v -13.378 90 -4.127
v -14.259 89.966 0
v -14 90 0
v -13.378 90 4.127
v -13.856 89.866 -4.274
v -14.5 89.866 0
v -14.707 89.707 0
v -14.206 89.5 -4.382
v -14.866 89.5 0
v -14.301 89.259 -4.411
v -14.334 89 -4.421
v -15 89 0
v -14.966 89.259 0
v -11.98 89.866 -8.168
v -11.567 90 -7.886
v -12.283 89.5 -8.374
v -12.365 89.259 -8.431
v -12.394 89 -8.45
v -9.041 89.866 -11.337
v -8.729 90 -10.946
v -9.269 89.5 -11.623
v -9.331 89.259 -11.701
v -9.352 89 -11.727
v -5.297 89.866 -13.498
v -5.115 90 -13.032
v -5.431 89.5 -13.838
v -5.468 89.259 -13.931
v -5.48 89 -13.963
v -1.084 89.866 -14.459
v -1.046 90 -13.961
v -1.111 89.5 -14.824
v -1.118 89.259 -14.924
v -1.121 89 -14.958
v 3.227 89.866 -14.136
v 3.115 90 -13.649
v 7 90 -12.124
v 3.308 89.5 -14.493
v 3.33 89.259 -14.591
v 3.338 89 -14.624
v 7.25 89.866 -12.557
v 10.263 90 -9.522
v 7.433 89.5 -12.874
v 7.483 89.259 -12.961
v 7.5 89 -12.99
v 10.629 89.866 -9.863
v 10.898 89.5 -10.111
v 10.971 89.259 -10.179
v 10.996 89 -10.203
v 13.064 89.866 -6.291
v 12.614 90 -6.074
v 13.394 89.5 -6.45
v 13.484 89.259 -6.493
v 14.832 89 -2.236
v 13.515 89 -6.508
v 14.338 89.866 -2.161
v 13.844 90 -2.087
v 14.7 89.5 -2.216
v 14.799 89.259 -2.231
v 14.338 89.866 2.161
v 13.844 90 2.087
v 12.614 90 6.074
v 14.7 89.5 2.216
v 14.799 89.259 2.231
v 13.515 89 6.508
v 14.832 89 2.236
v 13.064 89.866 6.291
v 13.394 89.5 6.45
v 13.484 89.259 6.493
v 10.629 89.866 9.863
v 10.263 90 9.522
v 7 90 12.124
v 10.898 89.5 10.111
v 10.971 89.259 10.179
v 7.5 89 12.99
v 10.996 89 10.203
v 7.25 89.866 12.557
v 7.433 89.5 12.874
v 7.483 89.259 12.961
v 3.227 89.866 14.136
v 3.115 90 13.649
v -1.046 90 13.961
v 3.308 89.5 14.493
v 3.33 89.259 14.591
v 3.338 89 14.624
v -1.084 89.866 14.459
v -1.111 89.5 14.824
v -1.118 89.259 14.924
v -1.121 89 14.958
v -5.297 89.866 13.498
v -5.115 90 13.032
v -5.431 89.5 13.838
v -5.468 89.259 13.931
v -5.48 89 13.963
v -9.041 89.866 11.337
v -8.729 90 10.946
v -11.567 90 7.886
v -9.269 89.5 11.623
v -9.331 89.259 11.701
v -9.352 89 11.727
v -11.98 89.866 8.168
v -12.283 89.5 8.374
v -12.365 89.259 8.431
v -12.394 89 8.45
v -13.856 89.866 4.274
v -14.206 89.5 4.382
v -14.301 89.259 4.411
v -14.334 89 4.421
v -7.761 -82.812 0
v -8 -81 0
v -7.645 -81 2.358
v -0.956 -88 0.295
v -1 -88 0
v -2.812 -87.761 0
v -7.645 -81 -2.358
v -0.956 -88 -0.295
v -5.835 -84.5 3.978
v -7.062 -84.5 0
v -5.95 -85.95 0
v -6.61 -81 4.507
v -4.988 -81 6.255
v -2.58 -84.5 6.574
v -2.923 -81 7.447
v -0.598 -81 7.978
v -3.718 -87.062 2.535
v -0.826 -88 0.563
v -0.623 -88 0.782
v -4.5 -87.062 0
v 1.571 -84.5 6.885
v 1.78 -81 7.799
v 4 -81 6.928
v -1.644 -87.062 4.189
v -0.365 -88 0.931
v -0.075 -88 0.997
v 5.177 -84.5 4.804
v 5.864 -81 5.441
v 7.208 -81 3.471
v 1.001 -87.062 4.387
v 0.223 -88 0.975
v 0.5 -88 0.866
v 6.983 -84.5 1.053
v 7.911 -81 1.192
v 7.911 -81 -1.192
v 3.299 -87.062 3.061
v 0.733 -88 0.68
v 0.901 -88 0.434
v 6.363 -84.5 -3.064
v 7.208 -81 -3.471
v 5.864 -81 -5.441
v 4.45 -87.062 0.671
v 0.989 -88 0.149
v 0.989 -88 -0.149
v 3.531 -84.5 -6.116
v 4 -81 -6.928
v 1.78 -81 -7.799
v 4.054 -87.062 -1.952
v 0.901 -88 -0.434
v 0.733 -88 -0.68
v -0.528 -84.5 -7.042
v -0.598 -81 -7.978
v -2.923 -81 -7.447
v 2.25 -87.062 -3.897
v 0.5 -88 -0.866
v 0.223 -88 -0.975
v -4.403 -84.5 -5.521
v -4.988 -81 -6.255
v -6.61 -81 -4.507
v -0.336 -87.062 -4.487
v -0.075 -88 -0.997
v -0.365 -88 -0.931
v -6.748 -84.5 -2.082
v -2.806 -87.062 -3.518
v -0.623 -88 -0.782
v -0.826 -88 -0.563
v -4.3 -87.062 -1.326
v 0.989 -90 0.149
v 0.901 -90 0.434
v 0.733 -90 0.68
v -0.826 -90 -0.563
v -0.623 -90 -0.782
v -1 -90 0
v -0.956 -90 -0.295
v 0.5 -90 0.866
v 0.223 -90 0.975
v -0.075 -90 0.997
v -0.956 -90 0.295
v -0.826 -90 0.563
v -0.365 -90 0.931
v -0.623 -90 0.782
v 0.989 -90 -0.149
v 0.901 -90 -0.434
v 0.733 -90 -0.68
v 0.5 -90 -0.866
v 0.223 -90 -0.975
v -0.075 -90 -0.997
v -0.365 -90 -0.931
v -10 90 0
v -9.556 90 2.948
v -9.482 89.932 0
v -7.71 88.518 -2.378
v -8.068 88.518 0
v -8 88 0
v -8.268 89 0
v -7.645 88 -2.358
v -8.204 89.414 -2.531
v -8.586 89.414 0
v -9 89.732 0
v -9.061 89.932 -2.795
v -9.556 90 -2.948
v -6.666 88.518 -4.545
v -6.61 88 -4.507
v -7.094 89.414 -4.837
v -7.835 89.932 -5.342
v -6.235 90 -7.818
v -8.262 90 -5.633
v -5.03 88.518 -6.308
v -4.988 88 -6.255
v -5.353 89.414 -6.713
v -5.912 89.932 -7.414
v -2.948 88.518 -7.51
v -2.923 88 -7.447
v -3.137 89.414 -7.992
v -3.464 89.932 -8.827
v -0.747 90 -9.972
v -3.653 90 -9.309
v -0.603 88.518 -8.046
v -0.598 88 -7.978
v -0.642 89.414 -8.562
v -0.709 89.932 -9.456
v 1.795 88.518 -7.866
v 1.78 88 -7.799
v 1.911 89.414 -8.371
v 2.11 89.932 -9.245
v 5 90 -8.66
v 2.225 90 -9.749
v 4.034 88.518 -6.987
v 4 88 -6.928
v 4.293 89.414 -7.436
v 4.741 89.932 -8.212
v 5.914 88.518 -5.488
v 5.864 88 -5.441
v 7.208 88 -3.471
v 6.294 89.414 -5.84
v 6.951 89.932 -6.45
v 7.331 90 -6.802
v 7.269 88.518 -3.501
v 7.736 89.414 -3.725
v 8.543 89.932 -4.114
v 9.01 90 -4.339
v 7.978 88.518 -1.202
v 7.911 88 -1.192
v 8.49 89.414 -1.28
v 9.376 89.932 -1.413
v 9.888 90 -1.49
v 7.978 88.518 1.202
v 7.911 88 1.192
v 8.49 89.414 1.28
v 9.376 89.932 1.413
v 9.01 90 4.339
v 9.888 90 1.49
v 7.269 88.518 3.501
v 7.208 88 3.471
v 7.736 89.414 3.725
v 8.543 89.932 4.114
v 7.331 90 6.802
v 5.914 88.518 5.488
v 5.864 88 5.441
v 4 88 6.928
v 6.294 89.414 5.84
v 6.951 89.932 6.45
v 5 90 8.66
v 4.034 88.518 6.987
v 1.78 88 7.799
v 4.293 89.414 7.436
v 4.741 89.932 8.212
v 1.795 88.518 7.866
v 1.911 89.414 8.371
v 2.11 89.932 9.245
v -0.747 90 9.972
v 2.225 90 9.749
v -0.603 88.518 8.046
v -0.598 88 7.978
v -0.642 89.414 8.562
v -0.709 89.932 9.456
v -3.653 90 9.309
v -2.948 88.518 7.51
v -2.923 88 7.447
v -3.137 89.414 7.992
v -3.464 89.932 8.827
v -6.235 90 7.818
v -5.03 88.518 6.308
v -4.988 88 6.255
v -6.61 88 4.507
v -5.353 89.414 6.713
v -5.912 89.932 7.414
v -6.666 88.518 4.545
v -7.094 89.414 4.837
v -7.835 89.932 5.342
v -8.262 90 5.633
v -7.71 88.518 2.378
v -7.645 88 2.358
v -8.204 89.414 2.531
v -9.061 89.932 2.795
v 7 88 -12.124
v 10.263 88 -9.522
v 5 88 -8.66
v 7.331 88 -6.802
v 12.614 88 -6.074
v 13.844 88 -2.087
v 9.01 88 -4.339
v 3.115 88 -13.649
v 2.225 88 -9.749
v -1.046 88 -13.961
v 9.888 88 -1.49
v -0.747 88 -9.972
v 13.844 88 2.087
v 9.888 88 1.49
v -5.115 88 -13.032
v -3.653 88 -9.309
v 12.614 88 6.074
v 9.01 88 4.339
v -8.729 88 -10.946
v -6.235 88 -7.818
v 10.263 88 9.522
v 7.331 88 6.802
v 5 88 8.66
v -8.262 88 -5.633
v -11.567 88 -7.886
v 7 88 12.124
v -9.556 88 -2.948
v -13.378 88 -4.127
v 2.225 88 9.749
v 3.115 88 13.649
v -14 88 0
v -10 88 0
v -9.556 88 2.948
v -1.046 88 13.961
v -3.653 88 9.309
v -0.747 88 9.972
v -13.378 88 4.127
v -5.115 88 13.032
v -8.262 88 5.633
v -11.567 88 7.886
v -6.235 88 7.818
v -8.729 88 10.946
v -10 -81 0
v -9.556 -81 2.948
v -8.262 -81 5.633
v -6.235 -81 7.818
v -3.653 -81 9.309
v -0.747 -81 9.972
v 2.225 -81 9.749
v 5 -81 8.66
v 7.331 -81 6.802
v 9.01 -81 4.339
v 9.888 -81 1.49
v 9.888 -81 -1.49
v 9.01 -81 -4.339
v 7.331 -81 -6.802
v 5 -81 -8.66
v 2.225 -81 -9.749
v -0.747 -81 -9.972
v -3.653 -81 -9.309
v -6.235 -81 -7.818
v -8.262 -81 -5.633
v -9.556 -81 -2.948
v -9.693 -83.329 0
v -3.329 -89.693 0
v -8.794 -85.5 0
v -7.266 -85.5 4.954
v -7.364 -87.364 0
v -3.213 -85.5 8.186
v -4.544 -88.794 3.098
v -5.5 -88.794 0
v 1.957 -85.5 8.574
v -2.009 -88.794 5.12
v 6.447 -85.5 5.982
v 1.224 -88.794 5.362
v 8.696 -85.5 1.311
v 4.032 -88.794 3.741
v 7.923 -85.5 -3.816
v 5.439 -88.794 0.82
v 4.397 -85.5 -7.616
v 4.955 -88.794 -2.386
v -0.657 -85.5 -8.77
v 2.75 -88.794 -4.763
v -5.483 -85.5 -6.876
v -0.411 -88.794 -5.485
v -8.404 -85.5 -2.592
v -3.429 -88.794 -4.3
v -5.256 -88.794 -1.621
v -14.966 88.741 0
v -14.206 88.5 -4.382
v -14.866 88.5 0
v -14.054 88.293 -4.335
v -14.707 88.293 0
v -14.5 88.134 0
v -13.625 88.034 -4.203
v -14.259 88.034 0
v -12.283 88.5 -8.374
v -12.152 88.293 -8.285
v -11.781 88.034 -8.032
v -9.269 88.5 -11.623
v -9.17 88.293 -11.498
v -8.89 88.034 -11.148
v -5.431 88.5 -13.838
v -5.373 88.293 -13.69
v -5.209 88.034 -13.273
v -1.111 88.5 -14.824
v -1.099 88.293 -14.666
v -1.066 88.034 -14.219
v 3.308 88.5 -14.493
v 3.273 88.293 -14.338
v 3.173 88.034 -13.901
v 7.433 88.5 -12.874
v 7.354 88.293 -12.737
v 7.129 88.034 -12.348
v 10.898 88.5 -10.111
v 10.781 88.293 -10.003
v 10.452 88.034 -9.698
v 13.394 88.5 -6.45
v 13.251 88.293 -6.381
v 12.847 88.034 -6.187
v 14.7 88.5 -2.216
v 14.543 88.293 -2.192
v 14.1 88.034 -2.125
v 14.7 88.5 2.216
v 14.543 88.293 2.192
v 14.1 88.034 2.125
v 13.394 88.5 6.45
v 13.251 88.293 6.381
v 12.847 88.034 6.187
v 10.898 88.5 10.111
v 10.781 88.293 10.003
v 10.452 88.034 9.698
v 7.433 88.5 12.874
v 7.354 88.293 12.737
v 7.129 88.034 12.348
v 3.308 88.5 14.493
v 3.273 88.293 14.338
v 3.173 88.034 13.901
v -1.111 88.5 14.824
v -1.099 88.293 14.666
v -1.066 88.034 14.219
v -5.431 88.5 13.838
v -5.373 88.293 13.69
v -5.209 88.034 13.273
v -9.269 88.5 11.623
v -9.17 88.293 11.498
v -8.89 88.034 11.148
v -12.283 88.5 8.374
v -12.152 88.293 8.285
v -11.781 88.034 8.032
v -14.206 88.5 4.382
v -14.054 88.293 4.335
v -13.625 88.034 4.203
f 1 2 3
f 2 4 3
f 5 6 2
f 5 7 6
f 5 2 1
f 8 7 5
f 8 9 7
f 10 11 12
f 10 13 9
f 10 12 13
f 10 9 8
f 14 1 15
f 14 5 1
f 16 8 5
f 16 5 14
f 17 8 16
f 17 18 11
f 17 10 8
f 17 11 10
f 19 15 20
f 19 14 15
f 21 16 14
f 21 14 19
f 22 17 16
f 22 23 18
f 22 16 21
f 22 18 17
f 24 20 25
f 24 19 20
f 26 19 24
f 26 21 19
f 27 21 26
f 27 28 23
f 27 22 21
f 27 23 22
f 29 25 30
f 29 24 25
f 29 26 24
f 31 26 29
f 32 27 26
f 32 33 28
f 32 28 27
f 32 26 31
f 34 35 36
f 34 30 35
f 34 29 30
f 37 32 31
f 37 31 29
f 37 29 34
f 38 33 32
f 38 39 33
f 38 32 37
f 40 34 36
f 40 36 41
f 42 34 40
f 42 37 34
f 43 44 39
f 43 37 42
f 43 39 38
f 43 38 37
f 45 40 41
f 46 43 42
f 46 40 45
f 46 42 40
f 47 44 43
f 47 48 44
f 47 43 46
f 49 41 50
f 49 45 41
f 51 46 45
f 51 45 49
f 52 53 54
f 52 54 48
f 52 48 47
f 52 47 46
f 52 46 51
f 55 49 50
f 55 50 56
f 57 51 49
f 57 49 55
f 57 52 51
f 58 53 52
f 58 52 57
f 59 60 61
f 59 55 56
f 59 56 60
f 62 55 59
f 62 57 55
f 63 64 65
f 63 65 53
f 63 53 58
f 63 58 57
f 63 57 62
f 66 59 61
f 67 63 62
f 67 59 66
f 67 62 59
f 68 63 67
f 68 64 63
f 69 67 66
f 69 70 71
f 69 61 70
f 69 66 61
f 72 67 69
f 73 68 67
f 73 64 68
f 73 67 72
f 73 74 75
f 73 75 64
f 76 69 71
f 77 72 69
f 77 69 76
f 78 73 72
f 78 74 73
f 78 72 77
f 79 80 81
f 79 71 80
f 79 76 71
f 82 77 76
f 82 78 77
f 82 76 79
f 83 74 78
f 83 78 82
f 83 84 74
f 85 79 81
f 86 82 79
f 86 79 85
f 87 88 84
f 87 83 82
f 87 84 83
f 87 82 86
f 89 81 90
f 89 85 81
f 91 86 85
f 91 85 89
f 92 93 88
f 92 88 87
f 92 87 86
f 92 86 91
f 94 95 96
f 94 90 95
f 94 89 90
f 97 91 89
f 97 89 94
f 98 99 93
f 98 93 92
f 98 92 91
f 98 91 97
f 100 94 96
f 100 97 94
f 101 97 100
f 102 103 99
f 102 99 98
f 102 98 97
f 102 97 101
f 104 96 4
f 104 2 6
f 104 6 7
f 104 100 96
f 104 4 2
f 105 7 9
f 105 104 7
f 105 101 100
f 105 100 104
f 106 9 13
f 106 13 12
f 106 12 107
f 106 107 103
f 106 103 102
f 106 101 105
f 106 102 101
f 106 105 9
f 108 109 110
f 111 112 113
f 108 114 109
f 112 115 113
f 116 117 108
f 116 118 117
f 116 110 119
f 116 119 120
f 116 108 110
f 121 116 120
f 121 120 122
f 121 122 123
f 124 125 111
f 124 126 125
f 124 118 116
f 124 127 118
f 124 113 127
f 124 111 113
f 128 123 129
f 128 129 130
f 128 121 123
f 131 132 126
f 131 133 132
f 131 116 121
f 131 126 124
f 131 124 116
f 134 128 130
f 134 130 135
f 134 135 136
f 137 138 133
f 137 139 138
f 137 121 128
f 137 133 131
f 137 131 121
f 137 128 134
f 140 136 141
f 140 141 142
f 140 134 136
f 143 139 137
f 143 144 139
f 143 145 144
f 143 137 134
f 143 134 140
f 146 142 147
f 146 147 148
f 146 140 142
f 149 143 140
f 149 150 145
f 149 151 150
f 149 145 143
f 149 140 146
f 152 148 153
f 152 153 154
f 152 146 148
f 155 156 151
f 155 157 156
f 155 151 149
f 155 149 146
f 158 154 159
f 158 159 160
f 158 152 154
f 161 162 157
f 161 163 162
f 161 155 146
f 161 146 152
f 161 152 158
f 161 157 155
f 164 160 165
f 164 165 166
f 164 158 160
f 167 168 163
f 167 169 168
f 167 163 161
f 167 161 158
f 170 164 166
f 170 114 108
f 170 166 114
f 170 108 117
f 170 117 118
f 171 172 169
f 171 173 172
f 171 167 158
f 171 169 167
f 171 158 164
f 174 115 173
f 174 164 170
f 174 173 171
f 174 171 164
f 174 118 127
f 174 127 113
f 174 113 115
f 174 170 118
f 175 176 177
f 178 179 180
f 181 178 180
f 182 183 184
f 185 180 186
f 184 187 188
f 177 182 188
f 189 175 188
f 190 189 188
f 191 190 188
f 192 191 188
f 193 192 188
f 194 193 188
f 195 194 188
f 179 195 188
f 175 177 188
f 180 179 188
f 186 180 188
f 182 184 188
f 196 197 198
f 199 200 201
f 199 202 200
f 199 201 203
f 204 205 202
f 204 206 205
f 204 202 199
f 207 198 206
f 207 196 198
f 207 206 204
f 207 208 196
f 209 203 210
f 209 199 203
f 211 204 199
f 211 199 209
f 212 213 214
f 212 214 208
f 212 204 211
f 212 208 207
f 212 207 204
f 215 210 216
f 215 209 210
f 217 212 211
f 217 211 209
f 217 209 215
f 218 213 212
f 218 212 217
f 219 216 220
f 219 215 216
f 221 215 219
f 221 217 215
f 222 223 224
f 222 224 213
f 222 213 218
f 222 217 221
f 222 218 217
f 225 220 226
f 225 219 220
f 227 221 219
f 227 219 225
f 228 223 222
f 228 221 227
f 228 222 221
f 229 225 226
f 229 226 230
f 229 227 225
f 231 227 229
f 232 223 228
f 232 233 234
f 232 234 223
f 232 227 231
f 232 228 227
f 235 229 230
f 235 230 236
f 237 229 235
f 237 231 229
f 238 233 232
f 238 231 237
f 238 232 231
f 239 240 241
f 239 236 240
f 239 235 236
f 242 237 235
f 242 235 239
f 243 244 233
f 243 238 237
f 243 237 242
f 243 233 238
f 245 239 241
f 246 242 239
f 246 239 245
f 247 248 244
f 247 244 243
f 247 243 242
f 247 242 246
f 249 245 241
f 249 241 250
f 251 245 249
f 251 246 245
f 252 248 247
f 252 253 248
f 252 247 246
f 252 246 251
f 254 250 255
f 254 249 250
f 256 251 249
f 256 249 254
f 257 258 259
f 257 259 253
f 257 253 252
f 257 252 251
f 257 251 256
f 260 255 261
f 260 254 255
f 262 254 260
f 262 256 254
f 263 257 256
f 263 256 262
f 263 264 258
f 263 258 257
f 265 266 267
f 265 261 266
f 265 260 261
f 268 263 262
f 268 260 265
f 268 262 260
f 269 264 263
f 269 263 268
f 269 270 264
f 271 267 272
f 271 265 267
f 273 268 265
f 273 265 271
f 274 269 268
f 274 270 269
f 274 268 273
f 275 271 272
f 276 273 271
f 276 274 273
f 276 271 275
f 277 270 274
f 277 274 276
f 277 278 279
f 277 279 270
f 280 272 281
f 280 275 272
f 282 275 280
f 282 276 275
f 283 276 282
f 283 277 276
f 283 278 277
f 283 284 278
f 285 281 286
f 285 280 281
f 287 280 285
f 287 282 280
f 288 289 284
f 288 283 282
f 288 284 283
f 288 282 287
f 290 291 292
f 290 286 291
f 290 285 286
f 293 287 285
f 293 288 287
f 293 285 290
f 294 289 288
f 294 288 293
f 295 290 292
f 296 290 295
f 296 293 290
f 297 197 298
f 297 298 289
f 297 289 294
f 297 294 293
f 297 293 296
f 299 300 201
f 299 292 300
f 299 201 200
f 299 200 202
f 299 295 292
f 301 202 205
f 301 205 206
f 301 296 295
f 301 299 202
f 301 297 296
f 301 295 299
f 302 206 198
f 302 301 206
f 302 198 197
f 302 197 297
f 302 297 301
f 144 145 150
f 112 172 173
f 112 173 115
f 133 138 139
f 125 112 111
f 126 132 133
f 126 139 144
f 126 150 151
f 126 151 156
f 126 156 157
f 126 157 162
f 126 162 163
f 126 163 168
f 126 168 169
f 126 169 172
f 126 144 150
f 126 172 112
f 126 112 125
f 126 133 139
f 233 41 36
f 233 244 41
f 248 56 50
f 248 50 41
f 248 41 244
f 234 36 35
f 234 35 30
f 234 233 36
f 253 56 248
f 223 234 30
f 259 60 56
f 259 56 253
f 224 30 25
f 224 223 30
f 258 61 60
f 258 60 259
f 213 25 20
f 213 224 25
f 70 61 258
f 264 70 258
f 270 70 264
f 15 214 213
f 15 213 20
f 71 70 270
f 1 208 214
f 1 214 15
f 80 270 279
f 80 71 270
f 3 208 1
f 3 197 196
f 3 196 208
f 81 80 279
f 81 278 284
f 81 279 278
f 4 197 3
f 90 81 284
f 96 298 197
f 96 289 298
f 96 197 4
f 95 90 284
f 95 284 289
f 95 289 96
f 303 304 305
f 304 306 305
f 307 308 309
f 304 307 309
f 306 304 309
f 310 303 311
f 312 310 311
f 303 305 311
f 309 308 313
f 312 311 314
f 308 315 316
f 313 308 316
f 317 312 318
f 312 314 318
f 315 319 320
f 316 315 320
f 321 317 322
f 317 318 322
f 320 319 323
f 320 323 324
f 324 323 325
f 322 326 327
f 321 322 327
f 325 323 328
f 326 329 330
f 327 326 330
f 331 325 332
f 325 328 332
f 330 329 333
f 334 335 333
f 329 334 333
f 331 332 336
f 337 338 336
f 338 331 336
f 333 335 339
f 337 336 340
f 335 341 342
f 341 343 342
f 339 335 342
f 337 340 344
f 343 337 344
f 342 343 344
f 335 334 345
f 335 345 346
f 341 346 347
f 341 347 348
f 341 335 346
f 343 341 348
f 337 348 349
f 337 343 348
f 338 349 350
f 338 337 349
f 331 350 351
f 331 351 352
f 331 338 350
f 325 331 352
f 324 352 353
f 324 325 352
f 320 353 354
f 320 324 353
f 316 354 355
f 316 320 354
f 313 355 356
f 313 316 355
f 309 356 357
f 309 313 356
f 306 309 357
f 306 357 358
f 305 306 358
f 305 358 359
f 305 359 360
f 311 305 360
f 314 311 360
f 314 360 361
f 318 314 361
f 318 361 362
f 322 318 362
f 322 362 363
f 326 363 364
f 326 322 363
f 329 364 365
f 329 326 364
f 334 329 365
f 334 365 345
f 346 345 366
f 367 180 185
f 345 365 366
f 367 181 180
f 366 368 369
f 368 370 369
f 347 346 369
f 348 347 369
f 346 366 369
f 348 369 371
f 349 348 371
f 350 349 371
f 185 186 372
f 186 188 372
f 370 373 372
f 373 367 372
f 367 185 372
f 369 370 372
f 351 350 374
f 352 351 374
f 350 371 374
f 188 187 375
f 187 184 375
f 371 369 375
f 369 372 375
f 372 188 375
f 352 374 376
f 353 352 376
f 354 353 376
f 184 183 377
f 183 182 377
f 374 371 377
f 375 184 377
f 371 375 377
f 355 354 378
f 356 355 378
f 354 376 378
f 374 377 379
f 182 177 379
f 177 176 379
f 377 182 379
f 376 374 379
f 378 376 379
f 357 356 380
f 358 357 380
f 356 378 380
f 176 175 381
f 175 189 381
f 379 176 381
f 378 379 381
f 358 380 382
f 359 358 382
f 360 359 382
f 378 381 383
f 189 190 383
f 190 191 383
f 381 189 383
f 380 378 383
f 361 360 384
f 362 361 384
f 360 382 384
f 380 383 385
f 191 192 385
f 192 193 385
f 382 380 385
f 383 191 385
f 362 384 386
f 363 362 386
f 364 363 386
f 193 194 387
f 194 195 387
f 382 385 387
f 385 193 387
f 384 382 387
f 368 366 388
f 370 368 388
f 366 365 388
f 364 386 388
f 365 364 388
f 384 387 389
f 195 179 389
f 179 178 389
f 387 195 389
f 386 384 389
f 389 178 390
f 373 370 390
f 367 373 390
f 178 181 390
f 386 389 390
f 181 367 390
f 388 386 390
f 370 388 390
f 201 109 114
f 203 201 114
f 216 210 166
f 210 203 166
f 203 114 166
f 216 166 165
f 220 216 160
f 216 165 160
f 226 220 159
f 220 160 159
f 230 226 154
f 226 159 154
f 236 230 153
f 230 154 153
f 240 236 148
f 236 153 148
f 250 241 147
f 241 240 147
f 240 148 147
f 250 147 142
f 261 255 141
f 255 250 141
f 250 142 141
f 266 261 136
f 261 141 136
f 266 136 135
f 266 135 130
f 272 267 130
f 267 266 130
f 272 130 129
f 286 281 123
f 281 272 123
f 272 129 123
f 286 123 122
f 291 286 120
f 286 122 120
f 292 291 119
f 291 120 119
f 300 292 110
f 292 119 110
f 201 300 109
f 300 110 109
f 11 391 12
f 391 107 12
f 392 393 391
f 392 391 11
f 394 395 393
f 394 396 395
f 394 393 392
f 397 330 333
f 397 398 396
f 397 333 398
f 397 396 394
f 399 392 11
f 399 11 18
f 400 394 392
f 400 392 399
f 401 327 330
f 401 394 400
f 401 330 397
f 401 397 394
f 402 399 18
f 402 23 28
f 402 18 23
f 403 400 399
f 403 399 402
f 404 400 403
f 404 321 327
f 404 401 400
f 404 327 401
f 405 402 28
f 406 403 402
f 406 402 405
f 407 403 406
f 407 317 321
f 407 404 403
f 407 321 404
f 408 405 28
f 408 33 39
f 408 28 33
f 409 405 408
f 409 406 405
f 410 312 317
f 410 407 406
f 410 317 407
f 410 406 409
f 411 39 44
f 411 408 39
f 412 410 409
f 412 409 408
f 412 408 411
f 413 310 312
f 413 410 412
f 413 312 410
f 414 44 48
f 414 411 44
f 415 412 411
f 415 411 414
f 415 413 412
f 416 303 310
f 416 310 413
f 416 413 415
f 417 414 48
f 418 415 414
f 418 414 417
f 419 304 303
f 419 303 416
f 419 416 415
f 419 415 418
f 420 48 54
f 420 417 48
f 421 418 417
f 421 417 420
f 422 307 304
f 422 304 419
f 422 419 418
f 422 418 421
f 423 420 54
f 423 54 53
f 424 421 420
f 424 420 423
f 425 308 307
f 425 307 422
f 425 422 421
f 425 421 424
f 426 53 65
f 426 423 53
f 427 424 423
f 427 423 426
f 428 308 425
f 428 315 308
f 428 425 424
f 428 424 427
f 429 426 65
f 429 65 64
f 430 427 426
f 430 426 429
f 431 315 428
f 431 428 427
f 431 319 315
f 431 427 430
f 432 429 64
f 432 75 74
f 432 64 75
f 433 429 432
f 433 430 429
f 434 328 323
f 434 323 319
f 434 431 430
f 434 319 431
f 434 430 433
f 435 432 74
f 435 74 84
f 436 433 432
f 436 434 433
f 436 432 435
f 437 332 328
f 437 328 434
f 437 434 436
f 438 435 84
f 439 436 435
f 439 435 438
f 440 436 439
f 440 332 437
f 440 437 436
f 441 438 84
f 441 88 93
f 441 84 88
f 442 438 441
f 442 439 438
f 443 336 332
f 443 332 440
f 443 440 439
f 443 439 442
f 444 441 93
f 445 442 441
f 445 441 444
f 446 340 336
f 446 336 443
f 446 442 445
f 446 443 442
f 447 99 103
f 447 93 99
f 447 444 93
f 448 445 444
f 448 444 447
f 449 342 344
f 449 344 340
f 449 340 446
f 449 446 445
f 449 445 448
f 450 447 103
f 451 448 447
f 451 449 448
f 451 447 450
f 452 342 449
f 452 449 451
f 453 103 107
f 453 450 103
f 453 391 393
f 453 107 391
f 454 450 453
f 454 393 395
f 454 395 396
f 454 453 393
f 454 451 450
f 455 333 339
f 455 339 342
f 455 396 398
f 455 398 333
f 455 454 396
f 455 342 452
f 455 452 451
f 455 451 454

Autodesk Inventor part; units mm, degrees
ref_plane "YZ Plane" through (0, 0, 0) normal (1, 0, 0) x (0, 1, 0)
ref_plane "XZ Plane" through (0, 0, 0) normal (0, 1, 0) x (-1, 0, 0)
ref_plane "XY Plane" through (0, 0, 0) normal (0, 0, 1) x (1, 0, 0)
sketch "Szkic1" plane through (0, 0, 0) normal (0, 0, 1) x (1, 0, 0)
  line L0 (1, -90) -> (-1, -90)
  line L1 (-10, -81) -> (-10, 90)
  line L2 (-10, 90) -> (-10, 90)
  line L3 (10, 90) -> (10, -81)
  line L4 (10, -90) -> (-10, 90) construction
  line L5 (-10, -90) -> (10, 90) construction
  arc A0 (1, -90) -> (10, -81) centre (1, -81) ccw
  arc A1 (-10, -81) -> (-1, -90) centre (-1, -81) ccw
  line L6 (-10, 90) -> (-14, 90)
  line L7 (-15, 89) -> (-15, 89)
  line L8 (-14, 88) -> (-10, 88)
  line L9 (-10, 88) -> (-10, 90)
  line L10 (10, 90) -> (14, 90)
  line L11 (15, 89) -> (15, 89)
  line L12 (14, 88) -> (10, 88)
  line L13 (10, 88) -> (10, 90)
  arc A2 (14, 88) -> (15, 89) centre (14, 89) ccw
  arc A3 (15, 89) -> (14, 90) centre (14, 89) ccw
  arc A4 (-15, 89) -> (-14, 88) centre (-14, 89) ccw
  arc A5 (-14, 90) -> (-15, 89) centre (-14, 89) ccw
  line L14 (-8, 88) -> (-8, -81)
  arc A6 (-8, -81) -> (-1, -88) centre (-1, -81) ccw
  line L15 (-1, -88) -> (1, -88)
  arc A7 (1, -88) -> (8, -81) centre (1, -81) ccw
  line L16 (8, -81) -> (8, 88)
  arc A8 (-8, 88) -> (-10, 90) centre (-10, 88) ccw
  line L17 (10, 90) -> (10, 90)
  arc A9 (10, 90) -> (8, 88) centre (10, 88) ccw
  line L18 (0, -90) -> (0, 71.327) construction
  line L19 (0, -90) -> (0, -88)
  point P0 (0, 0)
  point P1 (-15, 88)
  point P2 (-15, 90)
  point P3 (15, 88)
  point P4 (-10, 90)
  point P5 (-10, 88)
  dimension "d0" = 20
  dimension "d1" = 180
  dimension "d2" = 9
  dimension "d3" = 9
  dimension "d4" = 5
  dimension "d5" = 2
  dimension "d6" = 5
  dimension "d7" = 1
  dimension "d8" = 1
  dimension "d9" = 1
  dimension "d10" = 1
  dimension "d11" = 2
  dimension "d12" = 2
  dimension "d13" = 2
revolve "Obrót1" add sketch "Szkic1" angle 360 about axis through (0, -90, 0) along (0, 1, 0) contours L0 A1 L1 A8 L14 A6 L15 L19 | L8 A4 A5 L6 L1
properties part number "fiolka" material "Szkło"
